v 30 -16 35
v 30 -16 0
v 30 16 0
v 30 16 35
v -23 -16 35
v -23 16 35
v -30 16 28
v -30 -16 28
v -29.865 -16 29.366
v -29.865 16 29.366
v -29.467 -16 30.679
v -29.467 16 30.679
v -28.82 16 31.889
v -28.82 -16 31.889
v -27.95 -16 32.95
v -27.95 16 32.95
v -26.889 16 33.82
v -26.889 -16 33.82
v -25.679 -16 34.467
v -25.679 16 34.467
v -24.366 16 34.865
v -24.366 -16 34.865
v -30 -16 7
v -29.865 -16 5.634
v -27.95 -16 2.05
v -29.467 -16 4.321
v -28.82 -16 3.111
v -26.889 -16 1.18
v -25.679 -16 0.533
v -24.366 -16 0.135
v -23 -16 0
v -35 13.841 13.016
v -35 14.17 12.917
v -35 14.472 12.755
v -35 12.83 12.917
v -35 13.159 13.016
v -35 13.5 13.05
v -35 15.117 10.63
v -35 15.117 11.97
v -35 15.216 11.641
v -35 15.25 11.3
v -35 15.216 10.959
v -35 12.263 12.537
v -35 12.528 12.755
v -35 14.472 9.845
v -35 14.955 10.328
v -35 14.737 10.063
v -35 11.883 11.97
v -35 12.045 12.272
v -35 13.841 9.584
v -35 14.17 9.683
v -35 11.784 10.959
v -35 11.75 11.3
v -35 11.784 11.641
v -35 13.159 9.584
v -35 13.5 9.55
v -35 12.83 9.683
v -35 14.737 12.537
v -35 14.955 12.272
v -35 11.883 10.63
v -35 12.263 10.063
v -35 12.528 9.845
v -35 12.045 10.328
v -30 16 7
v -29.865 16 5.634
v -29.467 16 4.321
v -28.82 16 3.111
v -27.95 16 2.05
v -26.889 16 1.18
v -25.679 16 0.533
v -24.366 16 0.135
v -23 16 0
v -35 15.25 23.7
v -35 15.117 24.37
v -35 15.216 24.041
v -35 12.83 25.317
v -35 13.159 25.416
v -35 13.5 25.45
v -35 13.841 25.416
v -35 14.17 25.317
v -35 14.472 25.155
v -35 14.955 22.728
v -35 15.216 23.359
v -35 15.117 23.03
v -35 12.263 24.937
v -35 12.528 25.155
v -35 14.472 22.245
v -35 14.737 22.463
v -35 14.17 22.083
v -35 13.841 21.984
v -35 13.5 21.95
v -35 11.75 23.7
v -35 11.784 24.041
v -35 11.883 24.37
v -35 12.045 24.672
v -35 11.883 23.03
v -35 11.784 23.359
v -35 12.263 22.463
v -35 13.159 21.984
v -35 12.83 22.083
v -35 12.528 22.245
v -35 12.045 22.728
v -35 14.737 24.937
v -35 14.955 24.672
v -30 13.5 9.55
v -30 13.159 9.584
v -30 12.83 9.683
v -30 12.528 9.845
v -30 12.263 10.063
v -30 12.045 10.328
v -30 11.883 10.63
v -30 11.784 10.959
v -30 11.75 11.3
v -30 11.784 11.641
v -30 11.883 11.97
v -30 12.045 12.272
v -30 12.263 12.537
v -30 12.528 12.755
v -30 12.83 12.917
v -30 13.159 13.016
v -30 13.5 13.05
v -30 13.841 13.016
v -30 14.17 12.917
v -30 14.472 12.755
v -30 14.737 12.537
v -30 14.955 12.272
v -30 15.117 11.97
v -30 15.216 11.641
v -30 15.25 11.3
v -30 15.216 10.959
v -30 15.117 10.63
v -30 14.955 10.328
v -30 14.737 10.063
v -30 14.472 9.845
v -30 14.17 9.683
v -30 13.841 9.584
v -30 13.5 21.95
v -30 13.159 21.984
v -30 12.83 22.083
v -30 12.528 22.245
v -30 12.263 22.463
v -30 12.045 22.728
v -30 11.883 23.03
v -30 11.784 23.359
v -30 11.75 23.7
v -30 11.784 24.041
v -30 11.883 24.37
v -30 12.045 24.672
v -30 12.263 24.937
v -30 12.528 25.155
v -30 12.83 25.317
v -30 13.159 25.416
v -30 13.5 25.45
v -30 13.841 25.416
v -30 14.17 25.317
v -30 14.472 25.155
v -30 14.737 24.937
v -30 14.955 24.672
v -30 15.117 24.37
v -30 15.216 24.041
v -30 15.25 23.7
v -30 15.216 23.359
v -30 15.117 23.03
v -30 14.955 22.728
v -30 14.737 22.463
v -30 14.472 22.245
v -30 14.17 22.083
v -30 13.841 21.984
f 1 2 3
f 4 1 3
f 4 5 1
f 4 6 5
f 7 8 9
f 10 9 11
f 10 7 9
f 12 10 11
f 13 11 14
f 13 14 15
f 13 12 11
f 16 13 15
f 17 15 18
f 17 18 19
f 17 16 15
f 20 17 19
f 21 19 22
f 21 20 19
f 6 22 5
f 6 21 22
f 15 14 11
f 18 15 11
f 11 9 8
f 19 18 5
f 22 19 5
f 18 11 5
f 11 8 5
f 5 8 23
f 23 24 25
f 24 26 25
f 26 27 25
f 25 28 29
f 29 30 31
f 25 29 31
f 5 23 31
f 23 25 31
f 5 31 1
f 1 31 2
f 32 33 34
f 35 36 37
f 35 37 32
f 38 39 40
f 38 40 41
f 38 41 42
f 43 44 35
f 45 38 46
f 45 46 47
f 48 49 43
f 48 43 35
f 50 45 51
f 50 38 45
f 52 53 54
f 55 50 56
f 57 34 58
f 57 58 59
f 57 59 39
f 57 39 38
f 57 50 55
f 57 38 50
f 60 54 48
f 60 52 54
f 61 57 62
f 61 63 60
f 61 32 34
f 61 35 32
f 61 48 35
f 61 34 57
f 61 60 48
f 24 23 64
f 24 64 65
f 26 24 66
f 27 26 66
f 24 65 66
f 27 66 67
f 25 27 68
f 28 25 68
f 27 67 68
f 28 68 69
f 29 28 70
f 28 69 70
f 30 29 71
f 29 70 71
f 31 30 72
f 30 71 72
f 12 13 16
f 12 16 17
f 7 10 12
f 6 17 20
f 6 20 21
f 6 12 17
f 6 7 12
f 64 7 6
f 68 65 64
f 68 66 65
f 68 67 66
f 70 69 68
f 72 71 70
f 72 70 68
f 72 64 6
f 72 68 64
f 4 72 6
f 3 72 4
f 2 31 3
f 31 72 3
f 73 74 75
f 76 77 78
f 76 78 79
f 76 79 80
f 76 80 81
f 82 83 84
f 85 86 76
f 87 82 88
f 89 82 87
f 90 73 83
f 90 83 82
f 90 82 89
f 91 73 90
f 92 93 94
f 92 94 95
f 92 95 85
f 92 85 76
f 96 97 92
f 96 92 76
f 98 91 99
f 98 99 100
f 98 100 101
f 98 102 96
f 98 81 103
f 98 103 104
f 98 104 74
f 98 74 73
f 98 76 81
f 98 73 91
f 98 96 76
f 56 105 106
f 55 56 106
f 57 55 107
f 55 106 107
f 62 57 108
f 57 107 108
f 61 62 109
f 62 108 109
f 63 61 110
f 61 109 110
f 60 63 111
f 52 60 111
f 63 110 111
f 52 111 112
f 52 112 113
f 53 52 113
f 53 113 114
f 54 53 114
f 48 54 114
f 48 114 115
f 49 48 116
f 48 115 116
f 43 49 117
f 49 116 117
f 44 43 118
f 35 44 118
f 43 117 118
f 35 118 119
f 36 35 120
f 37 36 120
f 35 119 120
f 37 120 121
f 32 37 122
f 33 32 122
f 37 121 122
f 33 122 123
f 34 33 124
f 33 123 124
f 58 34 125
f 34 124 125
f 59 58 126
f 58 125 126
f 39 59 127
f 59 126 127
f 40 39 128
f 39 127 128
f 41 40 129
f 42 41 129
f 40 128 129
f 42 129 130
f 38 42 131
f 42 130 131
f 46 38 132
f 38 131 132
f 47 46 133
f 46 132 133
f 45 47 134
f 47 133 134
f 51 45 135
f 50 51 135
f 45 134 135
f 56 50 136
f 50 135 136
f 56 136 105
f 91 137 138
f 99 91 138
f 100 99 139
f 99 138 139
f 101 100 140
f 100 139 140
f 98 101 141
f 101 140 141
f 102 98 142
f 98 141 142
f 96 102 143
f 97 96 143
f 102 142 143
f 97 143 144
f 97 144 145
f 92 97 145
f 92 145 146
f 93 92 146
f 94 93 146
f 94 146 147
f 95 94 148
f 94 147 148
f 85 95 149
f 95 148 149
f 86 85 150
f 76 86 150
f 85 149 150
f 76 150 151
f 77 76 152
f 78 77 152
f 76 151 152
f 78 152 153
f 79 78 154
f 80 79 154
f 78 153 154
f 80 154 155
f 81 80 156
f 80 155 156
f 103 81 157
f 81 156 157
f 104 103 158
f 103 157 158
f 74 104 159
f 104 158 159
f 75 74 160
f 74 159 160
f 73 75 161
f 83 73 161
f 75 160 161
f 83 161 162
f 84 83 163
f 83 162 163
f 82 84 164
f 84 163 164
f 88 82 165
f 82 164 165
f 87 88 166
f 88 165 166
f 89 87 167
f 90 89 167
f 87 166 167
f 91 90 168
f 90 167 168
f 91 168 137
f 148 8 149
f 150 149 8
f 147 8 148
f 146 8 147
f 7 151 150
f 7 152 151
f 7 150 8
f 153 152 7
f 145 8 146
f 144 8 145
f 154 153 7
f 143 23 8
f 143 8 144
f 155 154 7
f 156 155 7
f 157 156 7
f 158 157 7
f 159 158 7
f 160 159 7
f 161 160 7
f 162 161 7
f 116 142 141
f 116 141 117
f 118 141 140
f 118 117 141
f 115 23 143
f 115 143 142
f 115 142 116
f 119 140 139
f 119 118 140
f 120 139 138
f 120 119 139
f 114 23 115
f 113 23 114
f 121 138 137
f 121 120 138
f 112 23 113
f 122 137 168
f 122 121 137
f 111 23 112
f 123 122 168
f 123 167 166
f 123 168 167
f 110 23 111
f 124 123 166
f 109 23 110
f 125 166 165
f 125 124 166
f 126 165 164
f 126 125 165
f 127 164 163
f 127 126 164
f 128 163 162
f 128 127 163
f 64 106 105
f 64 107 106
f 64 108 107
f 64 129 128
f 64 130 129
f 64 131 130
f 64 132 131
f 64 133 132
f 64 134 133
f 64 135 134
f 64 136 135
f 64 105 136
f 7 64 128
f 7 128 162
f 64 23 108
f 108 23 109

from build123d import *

# Parameters (mm, degrees)
SKETCH1_W           = 60
SKETCH1_H           = 32
BOSS_EXTRUDE1_DEPTH = 35
FILLET1_R           = 7
SKETCH3_R           = 1.75
BOSS_EXTRUDE3_DEPTH = 5


with BuildPart() as part:
    # Sketch1 → Boss-Extrude1 (new body)
    with BuildSketch(Plane.XY):
        Rectangle(SKETCH1_W, SKETCH1_H)
    extrude(amount=BOSS_EXTRUDE1_DEPTH)

    # Fillet1
    fillet1_edges = [part.edges().sort_by_distance(p)[0] for p in [
        (-30, 0, 35),
        (-30, 0, 0),
    ]]
    fillet(fillet1_edges, radius=FILLET1_R)

    # Sketch3 → Boss-Extrude3 (add)
    with BuildSketch(Plane(origin=(-30, 46, 0), x_dir=(0, 1, 0), z_dir=(-1, 0, 0))):
        with Locations(Location((-32.5, -11.3, 0), (0, 0, 90))):
            Circle(SKETCH3_R)
        with Locations(Location((-32.5, -23.7, 0), (0, 0, 90))):
            Circle(SKETCH3_R)
    extrude(amount=BOSS_EXTRUDE3_DEPTH)


solid = part.part
